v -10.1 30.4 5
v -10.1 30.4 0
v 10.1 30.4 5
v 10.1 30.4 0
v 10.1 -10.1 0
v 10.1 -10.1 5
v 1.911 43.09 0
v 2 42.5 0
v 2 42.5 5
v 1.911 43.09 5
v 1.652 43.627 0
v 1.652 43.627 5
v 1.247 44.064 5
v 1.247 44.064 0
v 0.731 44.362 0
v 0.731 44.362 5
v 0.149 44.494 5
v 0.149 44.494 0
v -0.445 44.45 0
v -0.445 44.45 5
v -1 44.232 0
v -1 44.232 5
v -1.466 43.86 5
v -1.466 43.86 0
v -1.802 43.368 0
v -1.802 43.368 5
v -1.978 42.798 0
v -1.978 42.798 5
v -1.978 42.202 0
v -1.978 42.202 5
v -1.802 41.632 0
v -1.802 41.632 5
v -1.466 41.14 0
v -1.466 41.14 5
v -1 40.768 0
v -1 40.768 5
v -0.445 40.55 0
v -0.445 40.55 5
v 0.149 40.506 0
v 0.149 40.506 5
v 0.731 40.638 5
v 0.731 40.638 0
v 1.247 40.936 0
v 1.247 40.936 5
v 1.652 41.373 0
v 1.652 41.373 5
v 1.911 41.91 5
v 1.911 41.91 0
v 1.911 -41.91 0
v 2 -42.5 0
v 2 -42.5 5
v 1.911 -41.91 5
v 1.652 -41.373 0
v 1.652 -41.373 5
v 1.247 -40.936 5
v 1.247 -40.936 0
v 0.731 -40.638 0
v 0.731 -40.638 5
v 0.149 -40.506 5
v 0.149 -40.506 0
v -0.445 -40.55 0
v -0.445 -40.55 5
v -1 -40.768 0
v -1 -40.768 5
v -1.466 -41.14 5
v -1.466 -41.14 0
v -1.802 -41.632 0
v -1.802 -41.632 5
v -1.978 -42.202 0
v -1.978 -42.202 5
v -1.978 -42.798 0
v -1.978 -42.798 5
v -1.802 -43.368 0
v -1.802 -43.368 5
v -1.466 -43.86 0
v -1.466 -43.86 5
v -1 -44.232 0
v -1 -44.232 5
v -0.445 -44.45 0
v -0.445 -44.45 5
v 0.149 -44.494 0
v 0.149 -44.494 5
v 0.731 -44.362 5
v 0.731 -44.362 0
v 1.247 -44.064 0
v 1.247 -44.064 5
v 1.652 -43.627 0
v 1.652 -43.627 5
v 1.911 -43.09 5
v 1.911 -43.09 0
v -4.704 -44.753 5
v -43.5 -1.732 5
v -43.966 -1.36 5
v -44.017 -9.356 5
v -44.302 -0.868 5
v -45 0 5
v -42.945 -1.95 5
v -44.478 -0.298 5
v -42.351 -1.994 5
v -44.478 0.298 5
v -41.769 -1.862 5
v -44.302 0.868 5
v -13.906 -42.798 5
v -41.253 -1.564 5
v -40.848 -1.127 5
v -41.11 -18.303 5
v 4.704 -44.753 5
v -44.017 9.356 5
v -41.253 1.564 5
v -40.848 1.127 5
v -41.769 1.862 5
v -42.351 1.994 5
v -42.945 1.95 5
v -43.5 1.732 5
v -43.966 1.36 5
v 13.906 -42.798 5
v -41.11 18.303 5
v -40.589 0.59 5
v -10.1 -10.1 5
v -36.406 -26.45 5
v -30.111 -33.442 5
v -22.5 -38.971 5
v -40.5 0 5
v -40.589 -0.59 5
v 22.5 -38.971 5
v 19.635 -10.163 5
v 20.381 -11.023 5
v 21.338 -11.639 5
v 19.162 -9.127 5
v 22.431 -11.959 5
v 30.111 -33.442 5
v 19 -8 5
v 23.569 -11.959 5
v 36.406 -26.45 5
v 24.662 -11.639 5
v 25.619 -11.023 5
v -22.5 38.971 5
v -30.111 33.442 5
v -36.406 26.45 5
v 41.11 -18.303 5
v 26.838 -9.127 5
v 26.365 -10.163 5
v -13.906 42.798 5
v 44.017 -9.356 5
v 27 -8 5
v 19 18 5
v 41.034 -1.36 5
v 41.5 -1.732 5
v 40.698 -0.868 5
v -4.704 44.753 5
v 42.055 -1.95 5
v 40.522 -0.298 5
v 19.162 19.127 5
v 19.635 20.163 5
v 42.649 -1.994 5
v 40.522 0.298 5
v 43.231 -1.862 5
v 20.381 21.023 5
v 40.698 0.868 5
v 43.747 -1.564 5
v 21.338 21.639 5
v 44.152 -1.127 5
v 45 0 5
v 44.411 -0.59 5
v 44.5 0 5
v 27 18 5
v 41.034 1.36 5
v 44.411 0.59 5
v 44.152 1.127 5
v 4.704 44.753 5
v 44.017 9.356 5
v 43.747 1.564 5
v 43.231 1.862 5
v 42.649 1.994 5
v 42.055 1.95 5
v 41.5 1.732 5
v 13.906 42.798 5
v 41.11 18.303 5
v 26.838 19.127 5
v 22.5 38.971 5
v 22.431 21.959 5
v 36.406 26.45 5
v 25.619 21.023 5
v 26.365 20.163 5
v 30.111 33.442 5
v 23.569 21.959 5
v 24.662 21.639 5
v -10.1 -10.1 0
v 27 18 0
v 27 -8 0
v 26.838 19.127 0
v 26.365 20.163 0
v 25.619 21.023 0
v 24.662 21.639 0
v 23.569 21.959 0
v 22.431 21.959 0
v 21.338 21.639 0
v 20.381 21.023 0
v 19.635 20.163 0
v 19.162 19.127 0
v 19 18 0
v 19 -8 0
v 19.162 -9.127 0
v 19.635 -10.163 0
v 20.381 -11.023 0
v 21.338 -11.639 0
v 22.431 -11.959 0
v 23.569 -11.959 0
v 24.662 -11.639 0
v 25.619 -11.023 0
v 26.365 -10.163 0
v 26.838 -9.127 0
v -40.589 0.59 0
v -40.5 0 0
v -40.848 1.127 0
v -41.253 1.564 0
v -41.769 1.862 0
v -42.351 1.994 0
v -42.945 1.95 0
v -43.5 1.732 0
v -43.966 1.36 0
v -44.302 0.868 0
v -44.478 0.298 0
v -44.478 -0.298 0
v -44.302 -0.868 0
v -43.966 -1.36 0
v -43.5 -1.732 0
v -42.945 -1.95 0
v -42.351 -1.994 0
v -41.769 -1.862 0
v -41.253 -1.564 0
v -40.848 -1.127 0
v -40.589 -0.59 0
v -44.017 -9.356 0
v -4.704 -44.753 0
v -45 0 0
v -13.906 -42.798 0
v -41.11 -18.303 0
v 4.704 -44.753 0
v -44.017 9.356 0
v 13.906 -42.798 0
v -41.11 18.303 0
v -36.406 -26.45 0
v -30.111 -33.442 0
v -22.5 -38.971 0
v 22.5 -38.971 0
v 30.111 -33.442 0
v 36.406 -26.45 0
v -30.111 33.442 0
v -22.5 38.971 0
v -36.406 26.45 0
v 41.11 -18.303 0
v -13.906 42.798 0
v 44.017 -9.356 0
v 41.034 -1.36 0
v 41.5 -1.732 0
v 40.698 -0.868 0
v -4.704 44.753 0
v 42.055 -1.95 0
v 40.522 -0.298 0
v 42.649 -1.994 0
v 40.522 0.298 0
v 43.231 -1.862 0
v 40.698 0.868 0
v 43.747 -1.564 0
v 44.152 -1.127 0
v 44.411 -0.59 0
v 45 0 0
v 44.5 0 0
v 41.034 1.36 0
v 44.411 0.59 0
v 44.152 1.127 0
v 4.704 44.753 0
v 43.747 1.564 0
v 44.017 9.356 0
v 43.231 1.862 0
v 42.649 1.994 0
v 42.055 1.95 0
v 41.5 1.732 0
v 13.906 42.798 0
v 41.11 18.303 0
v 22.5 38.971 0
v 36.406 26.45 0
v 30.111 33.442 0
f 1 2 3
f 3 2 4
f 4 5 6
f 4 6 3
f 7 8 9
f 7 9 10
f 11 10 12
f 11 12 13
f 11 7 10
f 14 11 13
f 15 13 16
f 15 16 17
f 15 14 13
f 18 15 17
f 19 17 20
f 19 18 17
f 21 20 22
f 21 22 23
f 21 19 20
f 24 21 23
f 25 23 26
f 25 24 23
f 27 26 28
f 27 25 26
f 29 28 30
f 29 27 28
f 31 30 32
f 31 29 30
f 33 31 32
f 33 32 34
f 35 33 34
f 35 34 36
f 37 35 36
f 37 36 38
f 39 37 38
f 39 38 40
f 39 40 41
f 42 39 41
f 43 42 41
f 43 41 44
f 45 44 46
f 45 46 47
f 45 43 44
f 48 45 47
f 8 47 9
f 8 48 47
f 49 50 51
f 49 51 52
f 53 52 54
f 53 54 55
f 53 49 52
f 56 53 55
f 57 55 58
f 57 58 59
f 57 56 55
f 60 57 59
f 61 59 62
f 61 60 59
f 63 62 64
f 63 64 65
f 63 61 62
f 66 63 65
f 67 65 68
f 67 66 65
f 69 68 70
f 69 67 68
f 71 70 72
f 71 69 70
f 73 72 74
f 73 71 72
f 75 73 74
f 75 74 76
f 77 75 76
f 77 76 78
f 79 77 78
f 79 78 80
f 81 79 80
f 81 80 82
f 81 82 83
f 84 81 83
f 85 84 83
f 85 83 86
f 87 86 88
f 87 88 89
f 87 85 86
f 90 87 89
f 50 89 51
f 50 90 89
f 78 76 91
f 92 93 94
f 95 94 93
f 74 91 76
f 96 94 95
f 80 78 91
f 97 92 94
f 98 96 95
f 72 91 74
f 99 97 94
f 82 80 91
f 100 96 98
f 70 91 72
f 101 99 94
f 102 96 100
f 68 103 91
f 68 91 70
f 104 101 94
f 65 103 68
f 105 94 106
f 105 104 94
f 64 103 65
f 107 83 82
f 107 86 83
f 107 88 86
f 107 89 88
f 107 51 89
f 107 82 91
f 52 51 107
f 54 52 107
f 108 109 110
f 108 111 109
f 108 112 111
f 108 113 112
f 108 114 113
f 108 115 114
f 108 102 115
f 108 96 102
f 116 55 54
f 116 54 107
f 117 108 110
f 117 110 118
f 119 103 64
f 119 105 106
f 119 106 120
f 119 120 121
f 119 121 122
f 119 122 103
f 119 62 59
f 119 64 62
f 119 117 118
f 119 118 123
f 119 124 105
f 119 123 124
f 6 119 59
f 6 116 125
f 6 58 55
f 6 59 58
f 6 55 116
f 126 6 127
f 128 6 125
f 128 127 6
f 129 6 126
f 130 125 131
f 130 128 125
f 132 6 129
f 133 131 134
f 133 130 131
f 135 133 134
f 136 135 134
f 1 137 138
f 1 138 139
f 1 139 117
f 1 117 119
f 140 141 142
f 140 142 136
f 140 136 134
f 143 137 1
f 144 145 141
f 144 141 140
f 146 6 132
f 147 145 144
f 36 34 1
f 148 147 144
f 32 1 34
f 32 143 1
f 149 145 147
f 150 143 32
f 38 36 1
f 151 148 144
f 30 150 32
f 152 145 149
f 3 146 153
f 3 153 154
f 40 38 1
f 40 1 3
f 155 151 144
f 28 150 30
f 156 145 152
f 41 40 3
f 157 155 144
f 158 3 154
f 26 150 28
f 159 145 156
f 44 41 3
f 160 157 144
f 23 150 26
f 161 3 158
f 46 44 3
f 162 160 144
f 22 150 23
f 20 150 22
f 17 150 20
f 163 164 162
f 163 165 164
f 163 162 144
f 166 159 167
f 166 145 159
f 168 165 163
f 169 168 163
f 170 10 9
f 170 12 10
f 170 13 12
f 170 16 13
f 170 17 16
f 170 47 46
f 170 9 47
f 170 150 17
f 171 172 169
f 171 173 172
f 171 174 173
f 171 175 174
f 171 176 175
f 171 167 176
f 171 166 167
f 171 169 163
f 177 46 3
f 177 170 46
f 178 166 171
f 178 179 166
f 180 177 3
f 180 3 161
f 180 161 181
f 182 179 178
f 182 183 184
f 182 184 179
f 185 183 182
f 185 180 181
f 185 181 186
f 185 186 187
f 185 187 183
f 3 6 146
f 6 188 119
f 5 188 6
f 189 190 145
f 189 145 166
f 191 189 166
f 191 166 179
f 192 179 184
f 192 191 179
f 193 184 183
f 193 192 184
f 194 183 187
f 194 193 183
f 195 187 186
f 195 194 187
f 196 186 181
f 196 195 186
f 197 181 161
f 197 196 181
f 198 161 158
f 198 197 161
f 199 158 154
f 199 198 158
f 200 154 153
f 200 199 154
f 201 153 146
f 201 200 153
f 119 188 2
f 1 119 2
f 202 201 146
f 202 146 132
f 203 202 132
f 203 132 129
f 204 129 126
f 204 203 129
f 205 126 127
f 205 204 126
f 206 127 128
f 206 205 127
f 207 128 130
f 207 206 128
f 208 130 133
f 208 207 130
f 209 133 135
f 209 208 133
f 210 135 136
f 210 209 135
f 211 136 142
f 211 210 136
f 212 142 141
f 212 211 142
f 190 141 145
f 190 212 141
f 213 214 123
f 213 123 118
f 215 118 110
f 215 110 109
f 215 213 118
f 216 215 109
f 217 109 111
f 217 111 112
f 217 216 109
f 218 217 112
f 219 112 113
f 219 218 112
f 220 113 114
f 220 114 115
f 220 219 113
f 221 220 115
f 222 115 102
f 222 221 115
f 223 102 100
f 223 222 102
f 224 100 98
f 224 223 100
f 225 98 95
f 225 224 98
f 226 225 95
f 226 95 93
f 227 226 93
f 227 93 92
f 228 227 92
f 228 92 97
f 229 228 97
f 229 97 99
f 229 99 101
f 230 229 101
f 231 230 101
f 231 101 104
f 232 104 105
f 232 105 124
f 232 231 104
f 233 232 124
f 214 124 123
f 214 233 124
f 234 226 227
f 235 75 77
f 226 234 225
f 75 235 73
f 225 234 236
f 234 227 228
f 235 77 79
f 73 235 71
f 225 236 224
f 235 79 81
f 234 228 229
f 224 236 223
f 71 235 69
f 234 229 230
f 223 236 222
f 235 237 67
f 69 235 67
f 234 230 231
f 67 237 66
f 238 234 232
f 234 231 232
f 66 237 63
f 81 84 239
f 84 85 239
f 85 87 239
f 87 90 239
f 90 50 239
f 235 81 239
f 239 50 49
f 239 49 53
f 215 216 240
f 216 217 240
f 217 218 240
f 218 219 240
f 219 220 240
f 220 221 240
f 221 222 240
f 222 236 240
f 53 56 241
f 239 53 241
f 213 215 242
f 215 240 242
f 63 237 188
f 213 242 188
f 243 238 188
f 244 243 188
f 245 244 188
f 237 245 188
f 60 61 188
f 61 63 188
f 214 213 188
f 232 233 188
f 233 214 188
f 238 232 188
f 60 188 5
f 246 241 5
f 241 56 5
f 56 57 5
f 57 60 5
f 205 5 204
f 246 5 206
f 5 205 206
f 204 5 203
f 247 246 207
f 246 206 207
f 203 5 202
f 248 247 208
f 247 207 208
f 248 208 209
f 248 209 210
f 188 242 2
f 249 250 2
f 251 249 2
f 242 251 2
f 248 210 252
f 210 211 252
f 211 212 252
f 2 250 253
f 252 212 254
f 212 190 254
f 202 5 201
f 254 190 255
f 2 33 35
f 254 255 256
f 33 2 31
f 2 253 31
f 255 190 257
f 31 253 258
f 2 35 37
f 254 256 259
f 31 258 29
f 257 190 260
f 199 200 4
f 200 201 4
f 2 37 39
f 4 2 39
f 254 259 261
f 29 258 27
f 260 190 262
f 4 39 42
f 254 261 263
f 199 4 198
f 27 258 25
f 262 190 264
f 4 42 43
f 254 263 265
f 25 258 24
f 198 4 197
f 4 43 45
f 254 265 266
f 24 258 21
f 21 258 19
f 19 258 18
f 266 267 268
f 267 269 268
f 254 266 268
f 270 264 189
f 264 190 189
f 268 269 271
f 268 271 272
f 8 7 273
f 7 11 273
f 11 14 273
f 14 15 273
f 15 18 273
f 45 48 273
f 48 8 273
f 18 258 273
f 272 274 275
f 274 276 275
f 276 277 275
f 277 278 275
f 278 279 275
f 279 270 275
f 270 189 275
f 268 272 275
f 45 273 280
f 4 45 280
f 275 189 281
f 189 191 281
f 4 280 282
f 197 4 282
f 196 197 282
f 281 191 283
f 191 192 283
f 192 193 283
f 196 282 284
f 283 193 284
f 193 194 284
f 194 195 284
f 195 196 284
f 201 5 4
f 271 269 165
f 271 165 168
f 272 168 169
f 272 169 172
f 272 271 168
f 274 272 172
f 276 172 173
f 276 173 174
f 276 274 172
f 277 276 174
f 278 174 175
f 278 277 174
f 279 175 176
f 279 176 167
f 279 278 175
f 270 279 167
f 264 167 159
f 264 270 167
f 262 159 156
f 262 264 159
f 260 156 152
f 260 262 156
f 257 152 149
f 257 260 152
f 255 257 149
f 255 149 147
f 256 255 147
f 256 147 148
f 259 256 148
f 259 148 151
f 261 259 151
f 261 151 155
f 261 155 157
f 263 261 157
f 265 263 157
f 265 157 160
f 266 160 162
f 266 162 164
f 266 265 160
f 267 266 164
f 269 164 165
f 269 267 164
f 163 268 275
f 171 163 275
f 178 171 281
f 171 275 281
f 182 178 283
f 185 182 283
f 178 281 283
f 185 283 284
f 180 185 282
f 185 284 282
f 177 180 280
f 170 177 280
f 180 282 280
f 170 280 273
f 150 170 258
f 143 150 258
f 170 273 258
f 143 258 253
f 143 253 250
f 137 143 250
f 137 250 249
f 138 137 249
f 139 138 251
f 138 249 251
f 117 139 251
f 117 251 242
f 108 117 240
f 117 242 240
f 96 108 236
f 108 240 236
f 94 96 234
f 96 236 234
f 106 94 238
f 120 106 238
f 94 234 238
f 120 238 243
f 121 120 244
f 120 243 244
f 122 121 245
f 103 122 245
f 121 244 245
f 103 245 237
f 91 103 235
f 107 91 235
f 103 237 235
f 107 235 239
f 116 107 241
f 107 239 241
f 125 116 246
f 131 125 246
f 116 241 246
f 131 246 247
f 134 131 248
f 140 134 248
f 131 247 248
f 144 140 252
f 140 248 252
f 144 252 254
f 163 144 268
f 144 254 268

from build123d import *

# Parameters (mm, degrees)
SKETCH1_R           = 45
SKETCH1_R_2         = 2
SKETCH1_W           = 20.2
SKETCH1_H           = 40.5
BOSS_EXTRUDE1_DEPTH = 5
CUT_EXTRUDE1_DEPTH  = 10


with BuildPart() as part:
    # Sketch1 → Boss-Extrude1 (new body)
    with BuildSketch(Plane.XY):
        Circle(SKETCH1_R)
        with Locations((42.5, 0)):
            Circle(SKETCH1_R_2, mode=Mode.SUBTRACT)
        with Locations((0, -42.5)):
            Circle(SKETCH1_R_2, mode=Mode.SUBTRACT)
        with Locations((-42.5, 0)):
            Circle(SKETCH1_R_2, mode=Mode.SUBTRACT)
        with Locations((0, 42.5)):
            Circle(SKETCH1_R_2, mode=Mode.SUBTRACT)
        with Locations((0, 10.15)):
            Rectangle(SKETCH1_W, SKETCH1_H, mode=Mode.SUBTRACT)
    extrude(amount=BOSS_EXTRUDE1_DEPTH)

    # Sketch2 → Cut-Extrude1 (cut)
    with BuildSketch(Plane(origin=(0, 0, 0), x_dir=(-1, 0, 0), z_dir=(0, 0, -1))):
        with BuildLine():
            Line((-19, 18), (-19, -8))
            ThreePointArc((-19, -8), (-23, -12), (-27, -8))
            Line((-27, -8), (-27, 18))
            ThreePointArc((-27, 18), (-23, 22), (-19, 18))
        make_face()
    extrude(amount=-CUT_EXTRUDE1_DEPTH, mode=Mode.SUBTRACT)


solid = part.part
